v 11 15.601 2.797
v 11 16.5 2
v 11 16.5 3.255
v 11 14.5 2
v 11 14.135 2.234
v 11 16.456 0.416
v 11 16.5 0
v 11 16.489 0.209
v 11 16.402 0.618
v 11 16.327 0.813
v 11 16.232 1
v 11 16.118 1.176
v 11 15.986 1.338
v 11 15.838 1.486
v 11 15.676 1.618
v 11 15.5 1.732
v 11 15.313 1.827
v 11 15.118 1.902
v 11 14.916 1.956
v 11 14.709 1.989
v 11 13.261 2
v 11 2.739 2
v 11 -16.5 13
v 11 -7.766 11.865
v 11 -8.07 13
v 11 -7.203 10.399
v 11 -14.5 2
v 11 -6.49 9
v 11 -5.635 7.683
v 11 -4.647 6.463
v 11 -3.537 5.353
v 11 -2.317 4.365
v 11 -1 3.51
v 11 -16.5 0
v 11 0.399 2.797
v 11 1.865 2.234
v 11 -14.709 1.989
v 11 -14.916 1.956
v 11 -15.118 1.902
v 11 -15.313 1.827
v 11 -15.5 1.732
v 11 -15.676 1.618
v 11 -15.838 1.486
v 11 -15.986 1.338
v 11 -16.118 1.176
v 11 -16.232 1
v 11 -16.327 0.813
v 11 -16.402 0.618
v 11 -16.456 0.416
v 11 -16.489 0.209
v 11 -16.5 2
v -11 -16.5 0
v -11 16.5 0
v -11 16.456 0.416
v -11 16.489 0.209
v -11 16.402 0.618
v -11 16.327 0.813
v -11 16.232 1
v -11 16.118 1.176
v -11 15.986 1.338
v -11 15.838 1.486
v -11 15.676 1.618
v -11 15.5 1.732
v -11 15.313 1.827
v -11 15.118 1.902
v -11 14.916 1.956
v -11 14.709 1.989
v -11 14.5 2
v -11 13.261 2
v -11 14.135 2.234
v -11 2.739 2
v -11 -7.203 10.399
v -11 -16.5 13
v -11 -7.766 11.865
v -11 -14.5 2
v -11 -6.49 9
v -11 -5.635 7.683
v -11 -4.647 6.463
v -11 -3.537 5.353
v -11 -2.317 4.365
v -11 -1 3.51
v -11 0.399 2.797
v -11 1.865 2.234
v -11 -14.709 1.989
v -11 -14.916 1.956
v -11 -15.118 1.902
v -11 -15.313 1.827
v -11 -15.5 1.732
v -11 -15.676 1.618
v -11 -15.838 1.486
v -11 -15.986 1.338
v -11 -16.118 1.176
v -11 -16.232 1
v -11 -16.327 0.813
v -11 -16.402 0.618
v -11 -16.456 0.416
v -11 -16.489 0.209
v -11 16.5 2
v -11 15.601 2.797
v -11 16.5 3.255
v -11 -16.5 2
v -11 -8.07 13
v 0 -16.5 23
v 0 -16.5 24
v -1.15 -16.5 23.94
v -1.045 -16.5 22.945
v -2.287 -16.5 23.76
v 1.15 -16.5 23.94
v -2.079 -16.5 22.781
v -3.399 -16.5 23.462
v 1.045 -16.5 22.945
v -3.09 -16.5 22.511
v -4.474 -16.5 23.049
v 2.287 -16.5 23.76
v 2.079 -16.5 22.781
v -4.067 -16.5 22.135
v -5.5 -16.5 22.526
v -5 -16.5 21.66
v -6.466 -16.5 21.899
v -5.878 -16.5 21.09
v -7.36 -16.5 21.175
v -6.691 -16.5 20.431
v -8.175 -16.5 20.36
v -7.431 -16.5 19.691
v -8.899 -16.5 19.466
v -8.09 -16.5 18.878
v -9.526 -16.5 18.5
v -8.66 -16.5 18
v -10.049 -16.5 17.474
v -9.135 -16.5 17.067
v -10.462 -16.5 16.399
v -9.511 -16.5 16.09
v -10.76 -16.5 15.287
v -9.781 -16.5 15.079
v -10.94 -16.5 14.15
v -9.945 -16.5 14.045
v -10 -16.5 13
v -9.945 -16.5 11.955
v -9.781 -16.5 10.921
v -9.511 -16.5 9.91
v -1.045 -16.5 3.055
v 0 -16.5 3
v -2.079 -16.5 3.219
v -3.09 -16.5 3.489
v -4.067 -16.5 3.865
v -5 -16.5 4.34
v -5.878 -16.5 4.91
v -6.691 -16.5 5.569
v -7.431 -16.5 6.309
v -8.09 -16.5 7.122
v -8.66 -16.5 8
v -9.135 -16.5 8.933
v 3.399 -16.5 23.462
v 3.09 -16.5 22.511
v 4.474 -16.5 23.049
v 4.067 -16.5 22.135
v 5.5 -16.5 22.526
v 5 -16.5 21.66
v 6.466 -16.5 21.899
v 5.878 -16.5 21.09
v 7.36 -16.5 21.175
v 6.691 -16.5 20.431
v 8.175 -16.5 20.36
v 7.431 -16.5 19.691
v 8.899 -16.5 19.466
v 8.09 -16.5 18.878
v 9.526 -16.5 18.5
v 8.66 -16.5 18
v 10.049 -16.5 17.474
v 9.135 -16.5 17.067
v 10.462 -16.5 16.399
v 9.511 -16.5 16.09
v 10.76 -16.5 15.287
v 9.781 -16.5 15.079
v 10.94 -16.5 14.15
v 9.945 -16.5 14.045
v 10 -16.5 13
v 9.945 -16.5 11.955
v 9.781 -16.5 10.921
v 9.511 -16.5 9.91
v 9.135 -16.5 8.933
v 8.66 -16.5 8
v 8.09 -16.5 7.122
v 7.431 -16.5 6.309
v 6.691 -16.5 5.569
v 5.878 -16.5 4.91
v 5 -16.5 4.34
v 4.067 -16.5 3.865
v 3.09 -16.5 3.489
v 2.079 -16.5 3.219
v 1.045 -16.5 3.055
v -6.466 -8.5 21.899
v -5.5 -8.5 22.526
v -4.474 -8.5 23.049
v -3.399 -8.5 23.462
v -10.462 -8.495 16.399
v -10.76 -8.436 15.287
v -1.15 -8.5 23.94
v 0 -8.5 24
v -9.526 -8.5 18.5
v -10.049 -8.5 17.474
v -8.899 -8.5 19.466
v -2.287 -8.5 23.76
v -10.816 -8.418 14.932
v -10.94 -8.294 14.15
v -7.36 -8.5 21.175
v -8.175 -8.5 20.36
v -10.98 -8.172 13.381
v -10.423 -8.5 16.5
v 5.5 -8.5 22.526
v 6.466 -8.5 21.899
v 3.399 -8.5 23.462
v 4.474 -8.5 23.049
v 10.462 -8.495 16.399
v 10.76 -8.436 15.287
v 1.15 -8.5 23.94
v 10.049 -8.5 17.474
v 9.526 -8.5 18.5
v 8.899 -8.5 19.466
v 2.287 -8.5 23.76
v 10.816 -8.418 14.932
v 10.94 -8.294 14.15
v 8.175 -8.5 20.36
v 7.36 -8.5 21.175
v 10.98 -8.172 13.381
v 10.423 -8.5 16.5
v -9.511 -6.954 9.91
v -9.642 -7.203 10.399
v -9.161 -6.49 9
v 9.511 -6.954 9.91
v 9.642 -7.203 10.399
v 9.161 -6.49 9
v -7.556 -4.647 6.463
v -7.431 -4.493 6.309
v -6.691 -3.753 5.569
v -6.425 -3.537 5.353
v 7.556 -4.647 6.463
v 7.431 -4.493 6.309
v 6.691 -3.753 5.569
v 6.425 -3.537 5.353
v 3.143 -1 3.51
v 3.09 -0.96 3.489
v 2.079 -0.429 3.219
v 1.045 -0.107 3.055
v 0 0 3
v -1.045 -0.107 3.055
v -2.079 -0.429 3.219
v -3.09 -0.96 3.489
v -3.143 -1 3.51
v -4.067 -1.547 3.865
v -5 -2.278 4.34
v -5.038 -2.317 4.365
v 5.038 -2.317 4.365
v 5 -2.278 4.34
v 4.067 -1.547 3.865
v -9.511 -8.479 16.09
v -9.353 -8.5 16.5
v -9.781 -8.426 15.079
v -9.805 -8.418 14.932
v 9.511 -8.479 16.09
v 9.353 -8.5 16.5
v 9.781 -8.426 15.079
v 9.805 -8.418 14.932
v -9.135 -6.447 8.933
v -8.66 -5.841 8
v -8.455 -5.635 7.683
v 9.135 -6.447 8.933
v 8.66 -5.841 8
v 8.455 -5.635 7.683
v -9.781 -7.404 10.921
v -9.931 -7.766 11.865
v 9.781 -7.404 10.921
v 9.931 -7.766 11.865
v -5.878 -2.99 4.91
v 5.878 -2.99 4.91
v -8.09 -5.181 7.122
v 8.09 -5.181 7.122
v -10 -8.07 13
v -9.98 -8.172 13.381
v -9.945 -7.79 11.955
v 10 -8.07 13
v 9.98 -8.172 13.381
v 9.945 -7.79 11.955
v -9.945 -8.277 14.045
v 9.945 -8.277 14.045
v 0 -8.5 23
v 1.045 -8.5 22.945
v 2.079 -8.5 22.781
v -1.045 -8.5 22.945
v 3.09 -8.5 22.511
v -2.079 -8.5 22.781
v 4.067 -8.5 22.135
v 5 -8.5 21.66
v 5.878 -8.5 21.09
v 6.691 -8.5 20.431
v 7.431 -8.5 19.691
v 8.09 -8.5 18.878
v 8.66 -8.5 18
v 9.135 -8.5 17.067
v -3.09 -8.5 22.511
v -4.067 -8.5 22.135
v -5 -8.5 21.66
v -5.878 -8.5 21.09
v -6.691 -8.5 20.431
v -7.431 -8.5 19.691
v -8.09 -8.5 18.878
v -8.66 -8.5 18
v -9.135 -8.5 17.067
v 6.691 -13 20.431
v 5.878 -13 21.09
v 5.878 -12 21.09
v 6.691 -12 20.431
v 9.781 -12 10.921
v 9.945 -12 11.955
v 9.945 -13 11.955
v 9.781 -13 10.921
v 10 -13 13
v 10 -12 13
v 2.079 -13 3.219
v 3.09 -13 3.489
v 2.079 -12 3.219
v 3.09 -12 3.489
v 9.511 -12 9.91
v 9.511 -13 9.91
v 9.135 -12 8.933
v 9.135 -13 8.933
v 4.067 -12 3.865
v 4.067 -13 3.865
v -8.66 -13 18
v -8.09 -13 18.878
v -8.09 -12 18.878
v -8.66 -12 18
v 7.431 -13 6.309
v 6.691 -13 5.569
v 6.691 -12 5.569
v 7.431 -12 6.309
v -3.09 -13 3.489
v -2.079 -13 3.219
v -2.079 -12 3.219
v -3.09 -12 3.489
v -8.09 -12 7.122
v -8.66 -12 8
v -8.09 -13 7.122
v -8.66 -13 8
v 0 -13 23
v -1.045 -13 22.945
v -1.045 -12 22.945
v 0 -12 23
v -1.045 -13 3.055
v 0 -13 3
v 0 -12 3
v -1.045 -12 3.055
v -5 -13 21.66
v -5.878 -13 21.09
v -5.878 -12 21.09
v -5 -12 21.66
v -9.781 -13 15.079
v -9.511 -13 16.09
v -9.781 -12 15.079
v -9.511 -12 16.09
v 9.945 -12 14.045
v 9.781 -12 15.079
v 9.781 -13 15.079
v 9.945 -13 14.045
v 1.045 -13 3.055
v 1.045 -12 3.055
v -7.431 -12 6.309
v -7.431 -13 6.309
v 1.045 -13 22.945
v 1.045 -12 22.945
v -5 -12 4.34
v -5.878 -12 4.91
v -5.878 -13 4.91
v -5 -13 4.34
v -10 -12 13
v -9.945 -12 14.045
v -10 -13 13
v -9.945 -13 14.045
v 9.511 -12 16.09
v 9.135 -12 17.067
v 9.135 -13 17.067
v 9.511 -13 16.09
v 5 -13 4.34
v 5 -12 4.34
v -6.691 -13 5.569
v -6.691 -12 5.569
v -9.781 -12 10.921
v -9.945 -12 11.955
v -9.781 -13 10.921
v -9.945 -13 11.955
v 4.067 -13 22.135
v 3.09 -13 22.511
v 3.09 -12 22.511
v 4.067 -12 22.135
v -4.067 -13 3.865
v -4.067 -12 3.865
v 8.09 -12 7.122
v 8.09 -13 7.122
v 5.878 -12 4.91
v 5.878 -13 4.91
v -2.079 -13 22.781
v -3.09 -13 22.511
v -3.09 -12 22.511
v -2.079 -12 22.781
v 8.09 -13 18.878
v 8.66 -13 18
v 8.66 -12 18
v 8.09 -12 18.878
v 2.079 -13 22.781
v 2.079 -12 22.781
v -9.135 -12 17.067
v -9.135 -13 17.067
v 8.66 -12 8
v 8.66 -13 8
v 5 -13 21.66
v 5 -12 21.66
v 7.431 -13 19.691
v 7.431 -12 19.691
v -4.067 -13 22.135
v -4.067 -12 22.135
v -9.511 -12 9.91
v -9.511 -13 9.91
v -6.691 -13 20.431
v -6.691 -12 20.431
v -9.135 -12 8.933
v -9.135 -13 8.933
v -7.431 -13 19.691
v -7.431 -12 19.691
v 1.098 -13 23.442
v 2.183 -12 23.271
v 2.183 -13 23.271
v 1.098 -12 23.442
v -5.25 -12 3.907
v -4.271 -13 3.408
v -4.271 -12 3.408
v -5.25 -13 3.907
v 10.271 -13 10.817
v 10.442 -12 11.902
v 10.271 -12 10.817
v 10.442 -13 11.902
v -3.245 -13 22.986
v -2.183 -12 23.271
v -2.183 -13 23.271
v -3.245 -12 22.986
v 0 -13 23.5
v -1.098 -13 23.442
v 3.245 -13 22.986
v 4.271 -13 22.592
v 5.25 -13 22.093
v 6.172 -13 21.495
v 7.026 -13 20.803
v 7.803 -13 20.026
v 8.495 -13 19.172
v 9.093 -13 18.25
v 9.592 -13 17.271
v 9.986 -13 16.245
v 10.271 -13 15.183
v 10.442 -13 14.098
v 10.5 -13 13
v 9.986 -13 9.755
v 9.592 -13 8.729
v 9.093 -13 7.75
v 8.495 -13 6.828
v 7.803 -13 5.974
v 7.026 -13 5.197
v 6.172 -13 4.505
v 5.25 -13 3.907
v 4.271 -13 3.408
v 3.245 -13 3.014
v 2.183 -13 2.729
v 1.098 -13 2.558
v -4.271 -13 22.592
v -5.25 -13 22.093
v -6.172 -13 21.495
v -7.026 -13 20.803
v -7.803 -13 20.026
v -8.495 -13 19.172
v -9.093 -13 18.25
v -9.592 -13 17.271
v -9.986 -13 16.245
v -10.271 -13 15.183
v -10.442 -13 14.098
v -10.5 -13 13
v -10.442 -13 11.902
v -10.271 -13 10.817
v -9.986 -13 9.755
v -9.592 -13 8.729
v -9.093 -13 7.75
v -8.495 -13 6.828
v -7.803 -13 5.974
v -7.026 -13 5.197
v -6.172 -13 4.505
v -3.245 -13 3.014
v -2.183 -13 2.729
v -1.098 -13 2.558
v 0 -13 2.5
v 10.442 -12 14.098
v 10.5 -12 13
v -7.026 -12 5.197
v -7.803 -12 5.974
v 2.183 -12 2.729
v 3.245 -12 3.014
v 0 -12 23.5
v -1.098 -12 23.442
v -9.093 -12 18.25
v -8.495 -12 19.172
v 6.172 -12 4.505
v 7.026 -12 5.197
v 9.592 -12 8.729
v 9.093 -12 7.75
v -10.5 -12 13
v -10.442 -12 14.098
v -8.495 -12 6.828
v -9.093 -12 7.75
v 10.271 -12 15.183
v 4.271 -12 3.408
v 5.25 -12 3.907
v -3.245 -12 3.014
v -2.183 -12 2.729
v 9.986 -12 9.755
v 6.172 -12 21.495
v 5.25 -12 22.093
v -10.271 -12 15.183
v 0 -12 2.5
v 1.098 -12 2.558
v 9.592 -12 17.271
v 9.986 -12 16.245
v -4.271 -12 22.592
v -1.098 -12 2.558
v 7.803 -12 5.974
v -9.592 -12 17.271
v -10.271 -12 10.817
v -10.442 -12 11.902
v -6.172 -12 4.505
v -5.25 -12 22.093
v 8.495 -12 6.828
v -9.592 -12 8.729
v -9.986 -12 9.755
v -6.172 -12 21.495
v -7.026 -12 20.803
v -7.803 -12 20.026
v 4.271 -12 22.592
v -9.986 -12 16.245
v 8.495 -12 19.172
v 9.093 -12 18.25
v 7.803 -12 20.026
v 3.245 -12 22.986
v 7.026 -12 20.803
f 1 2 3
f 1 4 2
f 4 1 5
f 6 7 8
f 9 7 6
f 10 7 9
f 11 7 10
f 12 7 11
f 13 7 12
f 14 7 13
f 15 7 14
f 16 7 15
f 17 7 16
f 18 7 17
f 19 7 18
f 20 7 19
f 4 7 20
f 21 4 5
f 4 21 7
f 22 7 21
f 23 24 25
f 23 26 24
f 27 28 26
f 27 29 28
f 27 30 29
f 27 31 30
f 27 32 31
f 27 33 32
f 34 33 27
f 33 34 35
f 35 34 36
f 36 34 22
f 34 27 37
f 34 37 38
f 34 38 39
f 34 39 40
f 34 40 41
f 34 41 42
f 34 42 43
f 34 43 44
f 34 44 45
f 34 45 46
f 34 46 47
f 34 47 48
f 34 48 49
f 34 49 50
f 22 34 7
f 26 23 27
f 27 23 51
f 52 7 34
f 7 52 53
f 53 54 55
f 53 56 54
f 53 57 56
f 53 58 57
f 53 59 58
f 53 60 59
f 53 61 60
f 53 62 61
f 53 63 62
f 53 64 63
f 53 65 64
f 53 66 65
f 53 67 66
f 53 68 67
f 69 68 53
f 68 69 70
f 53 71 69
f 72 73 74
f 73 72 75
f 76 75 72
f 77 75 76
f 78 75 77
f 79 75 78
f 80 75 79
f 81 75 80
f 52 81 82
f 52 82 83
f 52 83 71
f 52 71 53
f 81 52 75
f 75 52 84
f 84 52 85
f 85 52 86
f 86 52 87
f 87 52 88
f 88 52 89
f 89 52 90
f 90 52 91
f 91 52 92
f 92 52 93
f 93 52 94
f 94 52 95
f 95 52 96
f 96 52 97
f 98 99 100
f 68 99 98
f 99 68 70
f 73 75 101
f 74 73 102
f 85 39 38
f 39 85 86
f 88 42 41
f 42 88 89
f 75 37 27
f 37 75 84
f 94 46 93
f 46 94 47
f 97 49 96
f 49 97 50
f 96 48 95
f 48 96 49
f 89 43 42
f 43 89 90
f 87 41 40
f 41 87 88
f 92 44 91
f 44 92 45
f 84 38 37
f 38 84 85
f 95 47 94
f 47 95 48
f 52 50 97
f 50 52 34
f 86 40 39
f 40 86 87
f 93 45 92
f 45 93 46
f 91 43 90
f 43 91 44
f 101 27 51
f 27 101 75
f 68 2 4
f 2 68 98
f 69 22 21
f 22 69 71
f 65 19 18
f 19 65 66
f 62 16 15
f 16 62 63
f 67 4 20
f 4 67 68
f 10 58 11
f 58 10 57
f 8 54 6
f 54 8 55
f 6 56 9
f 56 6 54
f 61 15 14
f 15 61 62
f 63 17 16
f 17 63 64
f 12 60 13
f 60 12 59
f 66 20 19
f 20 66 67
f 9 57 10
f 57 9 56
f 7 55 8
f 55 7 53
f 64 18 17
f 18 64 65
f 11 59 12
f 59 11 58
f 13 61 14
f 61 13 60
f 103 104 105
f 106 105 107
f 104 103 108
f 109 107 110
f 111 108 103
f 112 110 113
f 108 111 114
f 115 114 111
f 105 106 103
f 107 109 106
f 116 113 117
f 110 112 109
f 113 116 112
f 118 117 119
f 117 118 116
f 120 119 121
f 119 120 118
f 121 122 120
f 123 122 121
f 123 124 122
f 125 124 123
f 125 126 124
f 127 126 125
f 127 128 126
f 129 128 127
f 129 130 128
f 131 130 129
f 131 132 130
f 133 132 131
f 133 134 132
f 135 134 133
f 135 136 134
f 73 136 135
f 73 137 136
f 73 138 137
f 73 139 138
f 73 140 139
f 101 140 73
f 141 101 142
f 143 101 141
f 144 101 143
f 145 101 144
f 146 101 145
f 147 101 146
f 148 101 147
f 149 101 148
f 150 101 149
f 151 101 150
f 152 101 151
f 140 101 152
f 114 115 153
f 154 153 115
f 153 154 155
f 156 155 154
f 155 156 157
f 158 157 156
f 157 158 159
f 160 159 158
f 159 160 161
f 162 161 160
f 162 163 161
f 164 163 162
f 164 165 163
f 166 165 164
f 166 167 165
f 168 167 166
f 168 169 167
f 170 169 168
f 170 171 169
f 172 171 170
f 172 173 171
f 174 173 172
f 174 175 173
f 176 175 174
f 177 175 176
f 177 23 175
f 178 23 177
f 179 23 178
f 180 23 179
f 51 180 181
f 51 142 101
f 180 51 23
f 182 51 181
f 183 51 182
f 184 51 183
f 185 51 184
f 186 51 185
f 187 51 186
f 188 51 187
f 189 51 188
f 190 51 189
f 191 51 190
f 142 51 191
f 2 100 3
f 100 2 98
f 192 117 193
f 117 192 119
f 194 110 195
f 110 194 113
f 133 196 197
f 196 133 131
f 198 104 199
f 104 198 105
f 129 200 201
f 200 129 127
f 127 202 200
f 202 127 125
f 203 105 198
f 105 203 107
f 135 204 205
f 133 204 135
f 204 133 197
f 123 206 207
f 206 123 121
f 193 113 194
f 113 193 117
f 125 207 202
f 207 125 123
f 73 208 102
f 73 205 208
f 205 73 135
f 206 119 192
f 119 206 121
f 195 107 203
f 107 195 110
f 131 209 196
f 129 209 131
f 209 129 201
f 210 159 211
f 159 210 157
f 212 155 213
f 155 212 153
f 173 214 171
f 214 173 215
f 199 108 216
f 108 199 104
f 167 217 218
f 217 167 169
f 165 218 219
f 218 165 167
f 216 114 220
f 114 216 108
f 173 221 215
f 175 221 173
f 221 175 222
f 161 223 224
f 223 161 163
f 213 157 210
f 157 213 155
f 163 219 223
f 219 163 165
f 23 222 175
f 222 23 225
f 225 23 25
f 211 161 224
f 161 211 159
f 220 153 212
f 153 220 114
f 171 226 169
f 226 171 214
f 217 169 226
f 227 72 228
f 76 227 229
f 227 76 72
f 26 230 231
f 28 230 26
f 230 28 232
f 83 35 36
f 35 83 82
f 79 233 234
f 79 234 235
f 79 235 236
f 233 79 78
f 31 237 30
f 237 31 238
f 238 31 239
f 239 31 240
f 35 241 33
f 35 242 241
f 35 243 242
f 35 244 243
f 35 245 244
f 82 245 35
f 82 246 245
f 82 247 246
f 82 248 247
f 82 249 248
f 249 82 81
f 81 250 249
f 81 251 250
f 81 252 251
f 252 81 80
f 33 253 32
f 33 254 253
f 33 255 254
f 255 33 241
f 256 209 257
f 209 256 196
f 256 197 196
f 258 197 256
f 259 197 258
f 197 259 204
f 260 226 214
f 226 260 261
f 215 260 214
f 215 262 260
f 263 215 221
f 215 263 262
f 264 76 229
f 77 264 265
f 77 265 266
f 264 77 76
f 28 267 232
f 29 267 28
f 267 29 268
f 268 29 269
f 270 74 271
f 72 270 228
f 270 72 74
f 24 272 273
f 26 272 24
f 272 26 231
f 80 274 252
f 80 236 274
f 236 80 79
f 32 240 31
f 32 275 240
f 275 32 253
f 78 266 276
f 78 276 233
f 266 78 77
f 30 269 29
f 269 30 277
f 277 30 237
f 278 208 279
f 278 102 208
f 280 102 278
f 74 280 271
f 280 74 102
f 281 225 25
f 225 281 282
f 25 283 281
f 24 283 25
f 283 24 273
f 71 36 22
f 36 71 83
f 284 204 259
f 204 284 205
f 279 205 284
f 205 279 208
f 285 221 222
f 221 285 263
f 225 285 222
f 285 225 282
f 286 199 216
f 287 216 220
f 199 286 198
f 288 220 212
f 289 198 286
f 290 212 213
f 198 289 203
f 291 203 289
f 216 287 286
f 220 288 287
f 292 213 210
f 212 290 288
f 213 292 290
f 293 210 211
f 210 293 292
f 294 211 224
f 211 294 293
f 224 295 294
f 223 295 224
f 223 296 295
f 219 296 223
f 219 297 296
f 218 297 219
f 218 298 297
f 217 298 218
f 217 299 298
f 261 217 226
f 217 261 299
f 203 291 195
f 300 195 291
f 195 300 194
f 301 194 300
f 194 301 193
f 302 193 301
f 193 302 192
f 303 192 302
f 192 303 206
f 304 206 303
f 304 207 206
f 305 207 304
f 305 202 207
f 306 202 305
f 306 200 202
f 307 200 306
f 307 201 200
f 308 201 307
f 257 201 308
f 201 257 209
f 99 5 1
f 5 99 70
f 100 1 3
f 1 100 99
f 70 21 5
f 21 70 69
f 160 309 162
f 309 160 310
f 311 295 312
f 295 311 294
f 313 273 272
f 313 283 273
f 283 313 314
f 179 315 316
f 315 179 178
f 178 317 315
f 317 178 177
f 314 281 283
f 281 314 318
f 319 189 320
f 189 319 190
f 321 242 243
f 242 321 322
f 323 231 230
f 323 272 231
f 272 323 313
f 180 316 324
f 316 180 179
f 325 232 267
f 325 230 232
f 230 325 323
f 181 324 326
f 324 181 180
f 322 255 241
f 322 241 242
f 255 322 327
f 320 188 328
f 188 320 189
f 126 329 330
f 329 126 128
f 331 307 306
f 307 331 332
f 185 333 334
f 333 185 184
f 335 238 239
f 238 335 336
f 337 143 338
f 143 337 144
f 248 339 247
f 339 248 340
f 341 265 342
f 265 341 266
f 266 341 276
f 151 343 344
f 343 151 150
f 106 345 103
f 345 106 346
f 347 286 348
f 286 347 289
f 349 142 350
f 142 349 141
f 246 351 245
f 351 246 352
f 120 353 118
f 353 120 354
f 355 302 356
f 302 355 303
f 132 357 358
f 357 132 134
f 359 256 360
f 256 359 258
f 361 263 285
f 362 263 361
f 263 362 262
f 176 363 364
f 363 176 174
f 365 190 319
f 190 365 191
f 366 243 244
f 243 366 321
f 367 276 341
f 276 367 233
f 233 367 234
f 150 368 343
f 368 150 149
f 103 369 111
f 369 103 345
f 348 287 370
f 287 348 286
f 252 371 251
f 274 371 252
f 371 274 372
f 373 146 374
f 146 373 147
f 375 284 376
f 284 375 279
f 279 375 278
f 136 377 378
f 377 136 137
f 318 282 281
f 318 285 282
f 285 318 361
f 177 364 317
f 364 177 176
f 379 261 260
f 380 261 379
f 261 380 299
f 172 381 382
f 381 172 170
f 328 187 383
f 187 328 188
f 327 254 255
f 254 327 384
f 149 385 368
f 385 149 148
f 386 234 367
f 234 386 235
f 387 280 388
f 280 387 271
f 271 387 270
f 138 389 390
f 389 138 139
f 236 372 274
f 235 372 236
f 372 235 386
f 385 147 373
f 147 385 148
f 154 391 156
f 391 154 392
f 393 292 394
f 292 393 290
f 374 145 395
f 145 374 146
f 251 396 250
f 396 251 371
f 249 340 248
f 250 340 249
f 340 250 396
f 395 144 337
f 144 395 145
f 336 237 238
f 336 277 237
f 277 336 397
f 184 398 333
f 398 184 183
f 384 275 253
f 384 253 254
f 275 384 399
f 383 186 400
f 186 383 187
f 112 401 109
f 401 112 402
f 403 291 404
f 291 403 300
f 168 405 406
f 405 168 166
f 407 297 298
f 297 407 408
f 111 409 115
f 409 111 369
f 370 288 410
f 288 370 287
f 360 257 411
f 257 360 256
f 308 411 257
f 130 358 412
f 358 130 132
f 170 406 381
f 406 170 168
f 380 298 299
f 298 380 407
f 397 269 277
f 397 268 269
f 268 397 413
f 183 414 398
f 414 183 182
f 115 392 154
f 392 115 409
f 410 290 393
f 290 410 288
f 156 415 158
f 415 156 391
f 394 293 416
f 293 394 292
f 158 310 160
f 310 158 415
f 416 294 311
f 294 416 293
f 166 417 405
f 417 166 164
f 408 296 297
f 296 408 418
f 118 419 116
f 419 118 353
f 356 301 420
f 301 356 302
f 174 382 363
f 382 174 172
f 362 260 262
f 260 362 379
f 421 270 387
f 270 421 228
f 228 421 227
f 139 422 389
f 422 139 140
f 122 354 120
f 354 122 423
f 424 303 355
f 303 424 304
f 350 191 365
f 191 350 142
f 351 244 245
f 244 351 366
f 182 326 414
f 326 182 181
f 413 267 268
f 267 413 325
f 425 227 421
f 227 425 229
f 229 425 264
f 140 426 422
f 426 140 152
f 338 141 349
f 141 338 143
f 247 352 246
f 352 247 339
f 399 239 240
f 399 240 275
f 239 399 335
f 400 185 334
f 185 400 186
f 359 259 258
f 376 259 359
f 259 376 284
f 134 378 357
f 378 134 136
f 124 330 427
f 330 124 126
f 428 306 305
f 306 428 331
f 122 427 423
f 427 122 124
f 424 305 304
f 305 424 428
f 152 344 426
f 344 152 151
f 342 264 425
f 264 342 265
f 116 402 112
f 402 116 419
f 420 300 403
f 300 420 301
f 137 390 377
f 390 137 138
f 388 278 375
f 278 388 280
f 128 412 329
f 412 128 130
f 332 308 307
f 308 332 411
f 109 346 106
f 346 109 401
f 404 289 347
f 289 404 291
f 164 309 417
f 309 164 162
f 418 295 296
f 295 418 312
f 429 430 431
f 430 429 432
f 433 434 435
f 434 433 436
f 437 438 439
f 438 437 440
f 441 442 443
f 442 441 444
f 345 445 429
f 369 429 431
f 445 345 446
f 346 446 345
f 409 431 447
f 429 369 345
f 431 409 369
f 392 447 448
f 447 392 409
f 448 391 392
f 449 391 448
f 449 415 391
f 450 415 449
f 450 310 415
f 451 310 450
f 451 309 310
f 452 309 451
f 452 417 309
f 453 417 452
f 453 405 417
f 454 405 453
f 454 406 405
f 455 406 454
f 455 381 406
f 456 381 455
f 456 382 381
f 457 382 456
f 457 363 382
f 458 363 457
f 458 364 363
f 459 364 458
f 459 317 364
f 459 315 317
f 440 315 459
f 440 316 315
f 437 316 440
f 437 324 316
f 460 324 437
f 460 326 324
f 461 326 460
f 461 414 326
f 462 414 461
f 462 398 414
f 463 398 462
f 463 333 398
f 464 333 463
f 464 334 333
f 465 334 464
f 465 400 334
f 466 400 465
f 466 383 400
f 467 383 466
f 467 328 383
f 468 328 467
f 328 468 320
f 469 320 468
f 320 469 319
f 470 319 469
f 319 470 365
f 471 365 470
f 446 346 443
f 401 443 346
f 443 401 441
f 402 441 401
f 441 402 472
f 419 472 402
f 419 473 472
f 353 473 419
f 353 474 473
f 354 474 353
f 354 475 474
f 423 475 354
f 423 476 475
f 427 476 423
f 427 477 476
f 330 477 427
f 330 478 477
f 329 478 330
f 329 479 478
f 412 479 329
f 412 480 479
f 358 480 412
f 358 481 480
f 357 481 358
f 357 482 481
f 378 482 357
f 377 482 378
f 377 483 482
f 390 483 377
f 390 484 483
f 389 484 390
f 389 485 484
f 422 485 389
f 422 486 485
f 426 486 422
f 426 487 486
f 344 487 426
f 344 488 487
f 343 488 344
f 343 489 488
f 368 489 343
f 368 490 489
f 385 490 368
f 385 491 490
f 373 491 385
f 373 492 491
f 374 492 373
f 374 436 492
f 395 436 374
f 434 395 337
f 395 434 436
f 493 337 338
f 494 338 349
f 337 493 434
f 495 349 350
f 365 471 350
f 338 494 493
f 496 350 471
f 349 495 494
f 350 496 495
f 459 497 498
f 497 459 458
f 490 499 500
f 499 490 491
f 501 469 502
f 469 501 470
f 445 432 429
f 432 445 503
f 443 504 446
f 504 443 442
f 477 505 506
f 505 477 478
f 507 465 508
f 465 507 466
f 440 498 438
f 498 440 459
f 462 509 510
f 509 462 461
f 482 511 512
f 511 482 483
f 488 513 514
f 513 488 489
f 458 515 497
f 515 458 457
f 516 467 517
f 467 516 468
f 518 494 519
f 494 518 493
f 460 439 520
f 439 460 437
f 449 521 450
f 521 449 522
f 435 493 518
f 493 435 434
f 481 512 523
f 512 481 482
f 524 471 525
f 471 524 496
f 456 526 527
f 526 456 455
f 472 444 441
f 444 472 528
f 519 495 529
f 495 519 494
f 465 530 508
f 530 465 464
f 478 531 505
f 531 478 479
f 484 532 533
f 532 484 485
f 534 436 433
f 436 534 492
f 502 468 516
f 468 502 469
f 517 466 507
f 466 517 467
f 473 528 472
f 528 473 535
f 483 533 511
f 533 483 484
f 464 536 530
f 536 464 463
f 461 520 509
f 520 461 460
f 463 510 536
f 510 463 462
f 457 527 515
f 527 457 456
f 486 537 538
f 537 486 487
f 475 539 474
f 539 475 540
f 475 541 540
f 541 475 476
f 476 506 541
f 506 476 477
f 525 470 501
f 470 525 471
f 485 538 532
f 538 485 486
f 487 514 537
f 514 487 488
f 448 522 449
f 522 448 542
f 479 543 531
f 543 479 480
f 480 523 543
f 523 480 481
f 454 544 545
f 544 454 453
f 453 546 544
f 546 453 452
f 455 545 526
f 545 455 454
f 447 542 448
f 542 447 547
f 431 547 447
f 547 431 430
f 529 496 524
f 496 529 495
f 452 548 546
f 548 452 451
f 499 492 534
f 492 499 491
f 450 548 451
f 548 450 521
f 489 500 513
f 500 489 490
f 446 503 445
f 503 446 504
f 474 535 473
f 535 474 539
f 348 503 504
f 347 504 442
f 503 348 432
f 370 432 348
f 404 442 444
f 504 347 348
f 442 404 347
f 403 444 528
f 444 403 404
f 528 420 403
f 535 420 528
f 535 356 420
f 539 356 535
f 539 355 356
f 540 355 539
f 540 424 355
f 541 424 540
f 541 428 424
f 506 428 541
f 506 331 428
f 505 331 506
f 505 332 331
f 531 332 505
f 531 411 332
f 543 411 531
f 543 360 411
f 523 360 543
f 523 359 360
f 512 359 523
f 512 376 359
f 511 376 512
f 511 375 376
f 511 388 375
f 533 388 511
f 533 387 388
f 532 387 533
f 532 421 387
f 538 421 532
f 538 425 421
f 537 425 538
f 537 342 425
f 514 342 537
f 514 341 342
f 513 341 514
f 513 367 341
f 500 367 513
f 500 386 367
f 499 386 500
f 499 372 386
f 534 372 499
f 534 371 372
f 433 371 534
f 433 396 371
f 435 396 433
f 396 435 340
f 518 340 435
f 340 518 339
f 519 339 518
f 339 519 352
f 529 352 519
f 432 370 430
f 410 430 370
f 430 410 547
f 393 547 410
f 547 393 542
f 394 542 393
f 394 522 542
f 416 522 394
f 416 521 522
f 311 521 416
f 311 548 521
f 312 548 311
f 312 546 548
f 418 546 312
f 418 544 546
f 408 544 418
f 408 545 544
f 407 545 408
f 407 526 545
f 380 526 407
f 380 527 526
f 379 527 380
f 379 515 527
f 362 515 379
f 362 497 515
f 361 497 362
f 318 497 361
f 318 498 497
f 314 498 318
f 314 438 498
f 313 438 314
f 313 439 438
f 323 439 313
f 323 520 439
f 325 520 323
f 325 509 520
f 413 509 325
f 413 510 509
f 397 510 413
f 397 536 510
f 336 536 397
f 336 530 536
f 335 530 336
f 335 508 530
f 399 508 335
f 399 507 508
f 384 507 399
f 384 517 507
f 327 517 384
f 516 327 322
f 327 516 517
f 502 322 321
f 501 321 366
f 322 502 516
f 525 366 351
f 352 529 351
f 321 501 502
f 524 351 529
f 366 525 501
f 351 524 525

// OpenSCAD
detail = 60;

chip_x = 22;
chip_y = 33;
chip_z = 2;
top_plate_curvature = 2;
ring_front_curvature = 15;
ring_back_curvature = 0;
ring_width = 6;
ring_height = chip_x;
ring_position = 8;
ring_curvature = chip_x / 2;
finger_diameter = 20;


ringster();


module ringster()
{
    
    rotate([180, 0, 0])
    translate([0, 0, - chip_z / 2])
    union()
    {
        top_plate();
        ring();
    }
}


module ring()
{
    difference()
    {
        ring_element();
        ring_cutout();
        ring_hole_cutout();
        ring_incision();
    }
}

module ring_incision()
{
    rotate([90,0,0])
    translate([0, - chip_x / 2 - chip_z / 2, ring_position - ring_width / 2 - 18])
    difference()
    {
        cylinder(1, finger_diameter / 2 + 0.5, finger_diameter / 2 + 0.5, false, $fn=detail);
    }
}

module ring_hole_cutout()
{
    rotate([90,0,0])
    translate([0, - chip_z / 2 - ring_height / 2, -chip_x])
    cylinder(chip_y, finger_diameter / 2, finger_diameter / 2, false, $fn=detail);
}

module ring_element()
{
    translate([0, 0, - chip_z / 2 - ring_height / 2])
    rotate([0,0,90])
    both_sided_spade(chip_y, chip_x, ring_height, ring_curvature);
}
//ring_cutout();

module ring_cutout()
{
    //front
    rotate([0,180,0])
    translate([
        0,
        -ring_position,
        chip_z / 2 + chip_x / 2
        ])
    both_sided_spade(ring_height + 1, chip_y, ring_height + 1, ring_front_curvature);
    
    //back
    rotate([0,180,0])
    translate([
        0,
        -ring_position + 35 + ring_width,
        chip_z / 2 + chip_x / 2
        ])
    both_sided_spade(ring_height + 1, chip_y, ring_height + 1, ring_back_curvature);
}


module top_plate()
{
    both_sided_spade(chip_x, chip_y, chip_z, top_plate_curvature);
}


//Spade on both ends
module both_sided_spade(x, y, z, rounding)
{
    intersection()
    {
        spade(x, y, z, rounding);
        rotate([0,0,180])
        spade(x, y, z, rounding);
    }
}

//make sure rounding is smaller than all x, y, z, or unexpected things may happen
//rounding appears along edge at +y, -z
module spade(x, y, z, rounding)
{
    translate([-x/2, -y/2, -z/2])
    {
        union()
        {
            cube([x, y - min(rounding, z), min(rounding, z)], false);
            translate([0, 0, min(rounding, z)])
            cube([x, y, z - min(rounding, z)], false);
            
            union()
            {
                intersection()
                {
                    cube([x, y, z], false);
                    translate([x / 2, y - rounding, min(rounding, z)])
                    rotate([0,90,0])
                    cylinder(x, rounding, rounding, true, $fn=detail);
                }
                translate([0, y - min(rounding, z), min(rounding, z)])
                cube([x, min(rounding, z), z - min(rounding, z)], false);
            }
        }
    }
}
